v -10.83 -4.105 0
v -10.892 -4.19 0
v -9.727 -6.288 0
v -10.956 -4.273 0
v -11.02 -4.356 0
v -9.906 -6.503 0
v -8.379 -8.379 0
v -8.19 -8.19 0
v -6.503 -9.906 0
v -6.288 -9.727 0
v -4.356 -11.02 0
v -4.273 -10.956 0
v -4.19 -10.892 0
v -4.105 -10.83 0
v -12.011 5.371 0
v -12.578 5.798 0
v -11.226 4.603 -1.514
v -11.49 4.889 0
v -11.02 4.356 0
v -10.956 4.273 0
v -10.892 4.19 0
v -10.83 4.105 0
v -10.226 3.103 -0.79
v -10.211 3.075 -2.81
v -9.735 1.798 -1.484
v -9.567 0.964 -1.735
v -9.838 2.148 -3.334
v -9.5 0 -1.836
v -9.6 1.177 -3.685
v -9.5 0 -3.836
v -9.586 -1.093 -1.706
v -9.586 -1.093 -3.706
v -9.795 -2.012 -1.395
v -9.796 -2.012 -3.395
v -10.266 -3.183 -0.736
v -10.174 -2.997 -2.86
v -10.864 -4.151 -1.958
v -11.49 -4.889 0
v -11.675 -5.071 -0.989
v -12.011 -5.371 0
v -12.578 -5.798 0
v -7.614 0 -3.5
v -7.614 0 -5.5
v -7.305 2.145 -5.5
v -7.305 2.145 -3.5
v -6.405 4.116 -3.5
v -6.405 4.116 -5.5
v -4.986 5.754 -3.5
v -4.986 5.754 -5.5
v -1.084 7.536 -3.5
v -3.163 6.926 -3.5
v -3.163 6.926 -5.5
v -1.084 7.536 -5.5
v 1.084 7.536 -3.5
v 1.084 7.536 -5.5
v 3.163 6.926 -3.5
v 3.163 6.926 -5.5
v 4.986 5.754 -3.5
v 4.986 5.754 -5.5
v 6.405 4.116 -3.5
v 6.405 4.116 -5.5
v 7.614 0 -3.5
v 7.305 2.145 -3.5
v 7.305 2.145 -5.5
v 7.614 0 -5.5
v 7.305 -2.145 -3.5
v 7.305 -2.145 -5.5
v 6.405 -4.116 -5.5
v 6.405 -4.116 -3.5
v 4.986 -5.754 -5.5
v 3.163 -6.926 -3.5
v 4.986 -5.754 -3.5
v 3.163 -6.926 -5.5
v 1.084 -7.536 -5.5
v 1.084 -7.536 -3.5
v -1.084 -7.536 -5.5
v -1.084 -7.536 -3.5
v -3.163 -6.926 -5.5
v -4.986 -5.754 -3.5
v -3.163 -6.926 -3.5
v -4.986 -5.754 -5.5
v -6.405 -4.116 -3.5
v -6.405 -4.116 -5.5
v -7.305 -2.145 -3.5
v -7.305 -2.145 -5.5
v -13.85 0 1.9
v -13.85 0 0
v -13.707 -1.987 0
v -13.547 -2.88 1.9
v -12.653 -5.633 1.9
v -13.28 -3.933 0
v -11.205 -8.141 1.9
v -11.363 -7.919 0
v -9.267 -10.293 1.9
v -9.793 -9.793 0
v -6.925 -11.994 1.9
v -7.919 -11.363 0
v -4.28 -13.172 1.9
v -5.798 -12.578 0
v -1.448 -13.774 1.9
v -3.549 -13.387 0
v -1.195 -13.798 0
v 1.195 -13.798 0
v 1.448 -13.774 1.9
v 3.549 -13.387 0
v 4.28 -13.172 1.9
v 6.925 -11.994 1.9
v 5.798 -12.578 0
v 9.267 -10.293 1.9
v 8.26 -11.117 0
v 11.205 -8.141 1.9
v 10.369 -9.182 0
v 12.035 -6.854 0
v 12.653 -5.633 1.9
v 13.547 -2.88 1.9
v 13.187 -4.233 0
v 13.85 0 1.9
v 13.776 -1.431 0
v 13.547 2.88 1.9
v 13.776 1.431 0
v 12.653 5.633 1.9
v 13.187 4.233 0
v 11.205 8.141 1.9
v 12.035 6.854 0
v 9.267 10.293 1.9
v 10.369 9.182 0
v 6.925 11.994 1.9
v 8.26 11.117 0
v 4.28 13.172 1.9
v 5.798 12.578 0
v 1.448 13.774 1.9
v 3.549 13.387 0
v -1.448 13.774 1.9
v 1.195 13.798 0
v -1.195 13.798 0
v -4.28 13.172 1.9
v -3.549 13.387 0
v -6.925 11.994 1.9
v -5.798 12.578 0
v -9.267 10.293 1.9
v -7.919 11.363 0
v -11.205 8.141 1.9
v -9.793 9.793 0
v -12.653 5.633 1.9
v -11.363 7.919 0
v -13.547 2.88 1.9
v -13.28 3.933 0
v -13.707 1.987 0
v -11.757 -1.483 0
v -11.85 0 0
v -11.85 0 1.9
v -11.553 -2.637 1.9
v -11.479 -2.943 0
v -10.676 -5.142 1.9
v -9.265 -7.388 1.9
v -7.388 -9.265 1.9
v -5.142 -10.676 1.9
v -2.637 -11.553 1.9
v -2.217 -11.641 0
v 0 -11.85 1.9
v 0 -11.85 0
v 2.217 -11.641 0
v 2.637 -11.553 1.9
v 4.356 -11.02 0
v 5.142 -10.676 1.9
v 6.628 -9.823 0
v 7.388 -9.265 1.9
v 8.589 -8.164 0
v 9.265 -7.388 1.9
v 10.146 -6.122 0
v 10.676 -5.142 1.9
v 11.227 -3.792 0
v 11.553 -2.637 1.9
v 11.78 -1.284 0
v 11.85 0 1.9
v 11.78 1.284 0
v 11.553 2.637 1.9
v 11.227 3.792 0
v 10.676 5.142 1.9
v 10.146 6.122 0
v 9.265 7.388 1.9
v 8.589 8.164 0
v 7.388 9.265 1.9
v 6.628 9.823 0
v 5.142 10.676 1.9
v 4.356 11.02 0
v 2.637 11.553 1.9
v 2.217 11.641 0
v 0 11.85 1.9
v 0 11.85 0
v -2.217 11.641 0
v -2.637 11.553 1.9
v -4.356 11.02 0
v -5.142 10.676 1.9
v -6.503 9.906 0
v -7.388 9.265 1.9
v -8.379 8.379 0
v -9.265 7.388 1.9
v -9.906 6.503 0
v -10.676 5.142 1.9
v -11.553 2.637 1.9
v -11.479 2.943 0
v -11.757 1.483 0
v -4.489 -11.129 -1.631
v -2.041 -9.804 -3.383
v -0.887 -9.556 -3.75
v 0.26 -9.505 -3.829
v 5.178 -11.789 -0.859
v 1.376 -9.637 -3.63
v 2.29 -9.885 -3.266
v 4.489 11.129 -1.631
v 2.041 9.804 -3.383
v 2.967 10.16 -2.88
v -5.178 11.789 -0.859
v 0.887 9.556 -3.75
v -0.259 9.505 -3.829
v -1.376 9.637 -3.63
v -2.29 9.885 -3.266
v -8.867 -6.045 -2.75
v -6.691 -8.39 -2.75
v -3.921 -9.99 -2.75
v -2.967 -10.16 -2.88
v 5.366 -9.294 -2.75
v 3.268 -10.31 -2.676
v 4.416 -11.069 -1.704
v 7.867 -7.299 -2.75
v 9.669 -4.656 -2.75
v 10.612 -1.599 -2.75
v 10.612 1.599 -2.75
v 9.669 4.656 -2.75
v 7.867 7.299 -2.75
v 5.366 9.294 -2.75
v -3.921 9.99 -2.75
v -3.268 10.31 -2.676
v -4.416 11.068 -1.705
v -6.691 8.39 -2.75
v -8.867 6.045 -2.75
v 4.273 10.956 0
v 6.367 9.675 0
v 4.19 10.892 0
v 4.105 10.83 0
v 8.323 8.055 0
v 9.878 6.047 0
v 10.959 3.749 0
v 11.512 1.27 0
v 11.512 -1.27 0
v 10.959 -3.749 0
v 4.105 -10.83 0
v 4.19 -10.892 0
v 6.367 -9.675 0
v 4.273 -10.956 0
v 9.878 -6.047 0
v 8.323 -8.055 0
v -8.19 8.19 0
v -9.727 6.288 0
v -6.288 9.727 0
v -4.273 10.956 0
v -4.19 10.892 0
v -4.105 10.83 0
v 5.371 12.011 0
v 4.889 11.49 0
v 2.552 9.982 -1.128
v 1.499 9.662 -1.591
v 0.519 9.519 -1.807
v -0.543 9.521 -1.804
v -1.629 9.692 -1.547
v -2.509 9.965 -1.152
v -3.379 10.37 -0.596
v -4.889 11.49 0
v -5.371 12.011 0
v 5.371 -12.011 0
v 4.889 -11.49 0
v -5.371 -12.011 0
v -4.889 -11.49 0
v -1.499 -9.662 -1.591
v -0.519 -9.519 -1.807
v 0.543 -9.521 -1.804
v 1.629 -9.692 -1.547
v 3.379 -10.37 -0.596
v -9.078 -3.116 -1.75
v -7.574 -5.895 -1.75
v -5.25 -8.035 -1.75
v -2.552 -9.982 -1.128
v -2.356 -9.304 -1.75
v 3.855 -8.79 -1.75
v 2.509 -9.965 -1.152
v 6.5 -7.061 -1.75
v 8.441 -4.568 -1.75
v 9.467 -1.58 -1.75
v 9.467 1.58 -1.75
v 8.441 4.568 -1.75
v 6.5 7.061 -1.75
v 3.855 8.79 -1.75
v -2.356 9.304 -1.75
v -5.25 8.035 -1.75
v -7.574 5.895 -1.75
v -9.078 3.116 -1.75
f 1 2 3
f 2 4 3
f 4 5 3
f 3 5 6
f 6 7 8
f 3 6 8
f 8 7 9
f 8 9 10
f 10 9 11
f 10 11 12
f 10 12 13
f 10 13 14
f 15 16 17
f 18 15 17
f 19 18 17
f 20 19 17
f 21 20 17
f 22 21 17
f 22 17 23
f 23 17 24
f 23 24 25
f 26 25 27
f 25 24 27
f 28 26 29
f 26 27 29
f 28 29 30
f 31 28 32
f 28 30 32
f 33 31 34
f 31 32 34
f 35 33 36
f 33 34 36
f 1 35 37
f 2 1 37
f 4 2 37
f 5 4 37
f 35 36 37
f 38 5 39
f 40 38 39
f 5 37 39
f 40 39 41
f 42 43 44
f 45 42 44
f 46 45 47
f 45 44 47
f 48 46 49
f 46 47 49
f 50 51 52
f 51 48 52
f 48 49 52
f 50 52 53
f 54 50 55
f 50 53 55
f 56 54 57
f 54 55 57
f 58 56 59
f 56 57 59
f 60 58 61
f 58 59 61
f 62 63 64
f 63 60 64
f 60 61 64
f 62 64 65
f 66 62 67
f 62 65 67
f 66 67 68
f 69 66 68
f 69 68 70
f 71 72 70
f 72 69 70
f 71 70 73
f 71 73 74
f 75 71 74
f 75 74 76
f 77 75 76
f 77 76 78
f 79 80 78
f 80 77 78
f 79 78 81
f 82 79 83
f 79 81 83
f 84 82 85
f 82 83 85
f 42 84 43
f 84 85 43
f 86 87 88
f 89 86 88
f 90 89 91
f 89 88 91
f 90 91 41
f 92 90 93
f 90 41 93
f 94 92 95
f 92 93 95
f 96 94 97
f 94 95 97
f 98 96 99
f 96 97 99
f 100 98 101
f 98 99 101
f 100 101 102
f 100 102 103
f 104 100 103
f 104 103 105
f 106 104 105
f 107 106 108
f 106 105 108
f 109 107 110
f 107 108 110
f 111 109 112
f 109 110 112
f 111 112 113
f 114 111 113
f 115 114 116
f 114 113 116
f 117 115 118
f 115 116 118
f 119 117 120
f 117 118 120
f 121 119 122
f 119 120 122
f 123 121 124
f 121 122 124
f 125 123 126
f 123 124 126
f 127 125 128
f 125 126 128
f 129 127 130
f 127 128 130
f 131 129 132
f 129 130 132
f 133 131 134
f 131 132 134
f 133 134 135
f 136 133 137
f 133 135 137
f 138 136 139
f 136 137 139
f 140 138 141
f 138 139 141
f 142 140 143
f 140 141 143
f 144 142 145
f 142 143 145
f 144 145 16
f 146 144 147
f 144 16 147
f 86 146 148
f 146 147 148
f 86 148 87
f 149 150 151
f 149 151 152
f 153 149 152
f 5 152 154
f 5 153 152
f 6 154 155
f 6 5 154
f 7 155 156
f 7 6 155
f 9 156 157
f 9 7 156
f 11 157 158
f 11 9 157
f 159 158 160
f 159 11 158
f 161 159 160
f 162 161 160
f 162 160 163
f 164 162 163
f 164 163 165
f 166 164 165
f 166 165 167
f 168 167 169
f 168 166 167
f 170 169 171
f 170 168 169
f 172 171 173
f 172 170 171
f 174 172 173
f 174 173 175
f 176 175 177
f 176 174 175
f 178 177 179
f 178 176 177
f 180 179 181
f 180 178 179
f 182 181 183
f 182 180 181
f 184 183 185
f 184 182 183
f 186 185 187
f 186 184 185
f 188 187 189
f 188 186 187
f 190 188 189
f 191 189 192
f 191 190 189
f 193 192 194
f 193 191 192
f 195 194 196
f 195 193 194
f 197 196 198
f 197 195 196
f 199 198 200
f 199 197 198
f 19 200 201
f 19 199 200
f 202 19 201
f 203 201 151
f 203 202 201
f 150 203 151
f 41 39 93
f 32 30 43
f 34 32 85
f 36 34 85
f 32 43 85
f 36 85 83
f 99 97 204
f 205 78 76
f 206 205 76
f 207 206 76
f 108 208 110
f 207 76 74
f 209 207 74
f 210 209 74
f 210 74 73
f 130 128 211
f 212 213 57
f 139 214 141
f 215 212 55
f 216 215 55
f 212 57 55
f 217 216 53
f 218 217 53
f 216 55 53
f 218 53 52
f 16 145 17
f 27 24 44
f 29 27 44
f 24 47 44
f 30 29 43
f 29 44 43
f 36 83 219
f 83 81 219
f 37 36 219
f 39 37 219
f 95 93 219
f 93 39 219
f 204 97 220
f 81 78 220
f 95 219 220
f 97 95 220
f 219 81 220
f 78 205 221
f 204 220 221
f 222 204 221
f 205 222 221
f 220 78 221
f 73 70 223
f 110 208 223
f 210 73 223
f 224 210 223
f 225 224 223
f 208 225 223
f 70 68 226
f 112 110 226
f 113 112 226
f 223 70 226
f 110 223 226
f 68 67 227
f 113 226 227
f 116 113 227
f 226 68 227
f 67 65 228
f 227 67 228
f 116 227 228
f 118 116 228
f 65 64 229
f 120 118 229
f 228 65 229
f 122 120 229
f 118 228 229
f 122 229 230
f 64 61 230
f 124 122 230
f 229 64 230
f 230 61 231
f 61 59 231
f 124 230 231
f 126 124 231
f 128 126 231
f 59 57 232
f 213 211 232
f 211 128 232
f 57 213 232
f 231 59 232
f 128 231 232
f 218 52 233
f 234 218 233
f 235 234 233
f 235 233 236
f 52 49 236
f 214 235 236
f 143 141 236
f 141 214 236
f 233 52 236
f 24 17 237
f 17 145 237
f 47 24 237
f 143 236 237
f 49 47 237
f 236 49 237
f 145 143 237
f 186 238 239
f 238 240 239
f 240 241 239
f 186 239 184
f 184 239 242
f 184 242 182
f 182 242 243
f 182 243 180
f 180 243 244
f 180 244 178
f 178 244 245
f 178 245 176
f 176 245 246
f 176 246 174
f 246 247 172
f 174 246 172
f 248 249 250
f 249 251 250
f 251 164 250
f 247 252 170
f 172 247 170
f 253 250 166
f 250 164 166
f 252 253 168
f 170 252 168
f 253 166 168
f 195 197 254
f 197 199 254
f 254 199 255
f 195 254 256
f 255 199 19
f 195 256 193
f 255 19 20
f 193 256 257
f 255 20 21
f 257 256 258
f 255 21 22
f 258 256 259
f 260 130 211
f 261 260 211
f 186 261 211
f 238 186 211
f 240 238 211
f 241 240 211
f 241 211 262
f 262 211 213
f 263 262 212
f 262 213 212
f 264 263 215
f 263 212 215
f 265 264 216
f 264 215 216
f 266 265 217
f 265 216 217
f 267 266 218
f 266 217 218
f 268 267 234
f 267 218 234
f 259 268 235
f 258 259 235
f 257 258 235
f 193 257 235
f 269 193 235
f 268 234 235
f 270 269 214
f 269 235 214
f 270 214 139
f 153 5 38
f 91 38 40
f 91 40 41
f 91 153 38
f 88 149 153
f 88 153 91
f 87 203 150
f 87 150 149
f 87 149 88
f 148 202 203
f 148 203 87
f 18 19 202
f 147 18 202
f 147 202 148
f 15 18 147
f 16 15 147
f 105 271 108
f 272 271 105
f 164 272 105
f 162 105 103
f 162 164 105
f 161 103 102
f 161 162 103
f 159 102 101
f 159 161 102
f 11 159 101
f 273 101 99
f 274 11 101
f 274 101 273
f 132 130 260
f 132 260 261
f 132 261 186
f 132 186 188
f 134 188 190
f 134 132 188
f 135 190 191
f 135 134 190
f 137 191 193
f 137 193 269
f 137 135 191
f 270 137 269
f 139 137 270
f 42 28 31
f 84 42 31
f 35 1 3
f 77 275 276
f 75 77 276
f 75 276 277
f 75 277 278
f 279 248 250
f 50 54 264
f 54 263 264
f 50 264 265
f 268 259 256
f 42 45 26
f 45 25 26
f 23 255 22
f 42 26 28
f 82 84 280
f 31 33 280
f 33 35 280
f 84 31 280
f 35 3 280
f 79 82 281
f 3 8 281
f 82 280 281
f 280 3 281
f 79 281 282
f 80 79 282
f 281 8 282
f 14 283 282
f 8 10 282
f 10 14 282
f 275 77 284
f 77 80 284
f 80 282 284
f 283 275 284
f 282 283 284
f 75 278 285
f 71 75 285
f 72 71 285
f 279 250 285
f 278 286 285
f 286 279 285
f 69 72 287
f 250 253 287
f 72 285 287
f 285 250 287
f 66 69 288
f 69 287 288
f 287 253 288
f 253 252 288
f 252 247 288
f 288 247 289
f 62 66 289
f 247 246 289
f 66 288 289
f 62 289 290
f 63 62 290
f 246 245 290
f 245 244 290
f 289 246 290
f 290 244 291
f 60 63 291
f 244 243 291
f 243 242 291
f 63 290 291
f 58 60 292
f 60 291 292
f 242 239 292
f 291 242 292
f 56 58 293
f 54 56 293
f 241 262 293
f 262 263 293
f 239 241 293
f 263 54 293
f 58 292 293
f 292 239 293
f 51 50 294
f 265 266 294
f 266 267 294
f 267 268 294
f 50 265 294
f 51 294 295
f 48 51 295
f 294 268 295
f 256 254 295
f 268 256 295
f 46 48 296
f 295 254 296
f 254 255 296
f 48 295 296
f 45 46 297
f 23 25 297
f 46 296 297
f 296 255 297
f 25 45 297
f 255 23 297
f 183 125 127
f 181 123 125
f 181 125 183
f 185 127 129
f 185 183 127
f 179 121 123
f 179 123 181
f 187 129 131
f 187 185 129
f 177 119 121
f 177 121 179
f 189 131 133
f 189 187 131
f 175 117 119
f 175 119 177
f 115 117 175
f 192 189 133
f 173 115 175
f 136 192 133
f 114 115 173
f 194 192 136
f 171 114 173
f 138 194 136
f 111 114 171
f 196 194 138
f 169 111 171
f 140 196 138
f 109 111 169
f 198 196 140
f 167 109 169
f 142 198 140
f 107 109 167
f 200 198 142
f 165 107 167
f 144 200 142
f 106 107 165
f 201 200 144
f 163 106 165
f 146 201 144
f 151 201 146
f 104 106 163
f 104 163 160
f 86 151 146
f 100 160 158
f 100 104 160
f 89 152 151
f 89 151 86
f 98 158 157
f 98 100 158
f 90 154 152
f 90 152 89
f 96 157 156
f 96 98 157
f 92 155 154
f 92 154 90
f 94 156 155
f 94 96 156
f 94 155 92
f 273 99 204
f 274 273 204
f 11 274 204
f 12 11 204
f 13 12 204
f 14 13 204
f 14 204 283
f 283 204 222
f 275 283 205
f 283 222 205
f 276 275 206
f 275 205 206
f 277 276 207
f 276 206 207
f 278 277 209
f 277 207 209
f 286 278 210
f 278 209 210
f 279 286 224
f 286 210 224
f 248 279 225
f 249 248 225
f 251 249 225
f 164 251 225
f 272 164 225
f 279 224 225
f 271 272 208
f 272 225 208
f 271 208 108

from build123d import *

# Parameters (mm, degrees)
SKETCH1_R           = 13.85
SKETCH1_R_2         = 11.85
BOSS_EXTRUDE1_DEPTH = 1.9
SKETCH4_R           = 7
SKETCH4_R_2         = 7.613586195
CUT_EXTRUDE2_DEPTH  = 5.5


with BuildPart() as part:
    # Sketch1 → Boss-Extrude1 (new body)
    with BuildSketch(Plane.XY):
        with Locations(Location((0, 0, 0), (0, 0, 180))):
            Circle(SKETCH1_R)
        with Locations(Location((0, 0, 0), (0, 0, 180))):
            Circle(SKETCH1_R_2, mode=Mode.SUBTRACT)
    extrude(amount=BOSS_EXTRUDE1_DEPTH)

    # Sketch2 → Revolve1 (revolve)
    with BuildSketch(Plane(origin=(0, 0, 0), x_dir=(1, 0, 0), z_dir=(0, 1, 0))):
        Polygon((-13.85, 0), (-7.613586195, 5.5), (0, 5.5), (0, 3.5), (-7.613586195, 3.5), (-11.582213162, 0), align=None)
    revolve(axis=Axis((0, 0, -5.5), (0, 0, 1)))

    # Sketch4 → Cut-Extrude2 (cut)
    with BuildSketch(Plane(origin=(0, 0, -5.5), x_dir=(-1, 0, 0), z_dir=(0, 0, -1))):
        with Locations((16.5, 0)):
            Circle(SKETCH4_R)
        Circle(SKETCH4_R_2)
        with Locations((0, -16.5)):
            Circle(SKETCH4_R)
        with Locations((0, 16.5)):
            Circle(SKETCH4_R)
    extrude(amount=-CUT_EXTRUDE2_DEPTH, mode=Mode.SUBTRACT)


solid = part.part
